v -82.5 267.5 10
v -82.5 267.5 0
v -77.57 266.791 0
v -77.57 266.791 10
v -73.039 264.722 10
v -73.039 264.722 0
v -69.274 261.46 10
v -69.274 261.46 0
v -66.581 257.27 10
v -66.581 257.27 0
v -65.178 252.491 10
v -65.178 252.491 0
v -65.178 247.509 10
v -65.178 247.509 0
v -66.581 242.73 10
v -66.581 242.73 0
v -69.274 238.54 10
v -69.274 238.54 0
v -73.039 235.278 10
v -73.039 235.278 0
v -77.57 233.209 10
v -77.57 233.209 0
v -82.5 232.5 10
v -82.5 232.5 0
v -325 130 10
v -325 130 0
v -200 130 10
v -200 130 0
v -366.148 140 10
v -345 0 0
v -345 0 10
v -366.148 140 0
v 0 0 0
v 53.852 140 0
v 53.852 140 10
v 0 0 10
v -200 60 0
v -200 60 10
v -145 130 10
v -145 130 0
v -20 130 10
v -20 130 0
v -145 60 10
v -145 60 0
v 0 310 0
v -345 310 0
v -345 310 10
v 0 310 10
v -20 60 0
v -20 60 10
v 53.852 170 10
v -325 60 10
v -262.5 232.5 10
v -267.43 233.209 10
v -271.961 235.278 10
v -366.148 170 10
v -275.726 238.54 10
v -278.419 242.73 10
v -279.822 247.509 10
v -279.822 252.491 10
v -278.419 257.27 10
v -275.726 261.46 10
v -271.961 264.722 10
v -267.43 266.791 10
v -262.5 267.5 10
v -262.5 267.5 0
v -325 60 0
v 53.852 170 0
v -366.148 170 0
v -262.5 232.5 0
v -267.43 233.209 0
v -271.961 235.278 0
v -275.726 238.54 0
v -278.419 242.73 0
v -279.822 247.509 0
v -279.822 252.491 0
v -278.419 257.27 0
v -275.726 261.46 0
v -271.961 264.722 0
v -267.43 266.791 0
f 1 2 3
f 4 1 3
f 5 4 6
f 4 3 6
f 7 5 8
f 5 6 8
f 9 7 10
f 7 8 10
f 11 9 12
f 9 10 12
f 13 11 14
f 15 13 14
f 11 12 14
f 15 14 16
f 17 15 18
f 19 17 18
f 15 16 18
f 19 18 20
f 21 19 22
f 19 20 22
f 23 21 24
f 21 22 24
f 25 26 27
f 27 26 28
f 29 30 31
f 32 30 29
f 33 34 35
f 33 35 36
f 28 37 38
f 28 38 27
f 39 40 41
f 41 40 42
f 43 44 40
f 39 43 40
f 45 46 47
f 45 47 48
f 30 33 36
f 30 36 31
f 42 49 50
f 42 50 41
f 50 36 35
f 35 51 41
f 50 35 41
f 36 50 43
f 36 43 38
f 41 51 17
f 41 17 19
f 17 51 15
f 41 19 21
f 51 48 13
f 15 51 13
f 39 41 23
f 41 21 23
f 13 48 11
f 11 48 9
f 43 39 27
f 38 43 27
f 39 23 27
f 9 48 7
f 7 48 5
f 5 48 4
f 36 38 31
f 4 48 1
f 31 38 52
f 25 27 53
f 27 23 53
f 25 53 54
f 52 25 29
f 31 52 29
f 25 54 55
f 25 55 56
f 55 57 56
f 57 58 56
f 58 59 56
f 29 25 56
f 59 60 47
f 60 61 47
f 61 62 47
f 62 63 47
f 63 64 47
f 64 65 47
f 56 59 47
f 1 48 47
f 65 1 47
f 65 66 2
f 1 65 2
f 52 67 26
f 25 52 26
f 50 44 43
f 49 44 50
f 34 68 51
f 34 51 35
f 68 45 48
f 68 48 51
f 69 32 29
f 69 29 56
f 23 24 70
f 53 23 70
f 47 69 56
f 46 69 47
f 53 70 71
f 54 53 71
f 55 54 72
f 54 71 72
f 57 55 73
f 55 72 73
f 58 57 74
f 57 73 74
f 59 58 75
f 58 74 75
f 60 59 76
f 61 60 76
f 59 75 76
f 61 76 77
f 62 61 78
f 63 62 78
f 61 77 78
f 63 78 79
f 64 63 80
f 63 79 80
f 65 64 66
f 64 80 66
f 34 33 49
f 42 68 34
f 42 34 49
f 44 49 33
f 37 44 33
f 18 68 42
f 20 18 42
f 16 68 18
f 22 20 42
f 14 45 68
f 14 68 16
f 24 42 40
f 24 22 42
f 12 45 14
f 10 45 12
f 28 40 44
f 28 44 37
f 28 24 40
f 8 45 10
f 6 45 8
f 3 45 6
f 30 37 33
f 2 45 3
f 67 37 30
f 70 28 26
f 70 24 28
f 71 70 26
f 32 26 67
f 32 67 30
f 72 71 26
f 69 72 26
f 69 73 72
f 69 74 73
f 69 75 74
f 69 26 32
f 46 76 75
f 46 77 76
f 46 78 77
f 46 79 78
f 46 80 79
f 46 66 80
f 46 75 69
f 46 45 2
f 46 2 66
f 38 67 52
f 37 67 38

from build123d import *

# Parameters (mm, degrees)
SKETCH4_W           = 125
SKETCH4_H           = 70
BOSS_EXTRUDE1_DEPTH = 10


with BuildPart() as part:
    # Sketch4 → Boss-Extrude1 (new body)
    with BuildSketch(Plane.XY):
        Polygon((0, 0), (-345, 0), (-366.148351929, 140), (-366.148351929, 170), (-345, 310), (0, 310), (53.851648071, 170), (53.851648071, 140), align=None)
        with BuildLine():
            Line((-262.5, 267.5), (-82.5, 267.5))
            ThreePointArc((-82.5, 267.5), (-65, 250), (-82.5, 232.5))
            Line((-82.5, 232.5), (-262.5, 232.5))
            ThreePointArc((-262.5, 232.5), (-280, 250), (-262.5, 267.5))
        make_face(mode=Mode.SUBTRACT)
        with Locations((-262.5, 95)):
            Rectangle(SKETCH4_W, SKETCH4_H, mode=Mode.SUBTRACT)
        with Locations((-82.5, 95)):
            Rectangle(SKETCH4_W, SKETCH4_H, mode=Mode.SUBTRACT)
    extrude(amount=BOSS_EXTRUDE1_DEPTH)


solid = part.part
